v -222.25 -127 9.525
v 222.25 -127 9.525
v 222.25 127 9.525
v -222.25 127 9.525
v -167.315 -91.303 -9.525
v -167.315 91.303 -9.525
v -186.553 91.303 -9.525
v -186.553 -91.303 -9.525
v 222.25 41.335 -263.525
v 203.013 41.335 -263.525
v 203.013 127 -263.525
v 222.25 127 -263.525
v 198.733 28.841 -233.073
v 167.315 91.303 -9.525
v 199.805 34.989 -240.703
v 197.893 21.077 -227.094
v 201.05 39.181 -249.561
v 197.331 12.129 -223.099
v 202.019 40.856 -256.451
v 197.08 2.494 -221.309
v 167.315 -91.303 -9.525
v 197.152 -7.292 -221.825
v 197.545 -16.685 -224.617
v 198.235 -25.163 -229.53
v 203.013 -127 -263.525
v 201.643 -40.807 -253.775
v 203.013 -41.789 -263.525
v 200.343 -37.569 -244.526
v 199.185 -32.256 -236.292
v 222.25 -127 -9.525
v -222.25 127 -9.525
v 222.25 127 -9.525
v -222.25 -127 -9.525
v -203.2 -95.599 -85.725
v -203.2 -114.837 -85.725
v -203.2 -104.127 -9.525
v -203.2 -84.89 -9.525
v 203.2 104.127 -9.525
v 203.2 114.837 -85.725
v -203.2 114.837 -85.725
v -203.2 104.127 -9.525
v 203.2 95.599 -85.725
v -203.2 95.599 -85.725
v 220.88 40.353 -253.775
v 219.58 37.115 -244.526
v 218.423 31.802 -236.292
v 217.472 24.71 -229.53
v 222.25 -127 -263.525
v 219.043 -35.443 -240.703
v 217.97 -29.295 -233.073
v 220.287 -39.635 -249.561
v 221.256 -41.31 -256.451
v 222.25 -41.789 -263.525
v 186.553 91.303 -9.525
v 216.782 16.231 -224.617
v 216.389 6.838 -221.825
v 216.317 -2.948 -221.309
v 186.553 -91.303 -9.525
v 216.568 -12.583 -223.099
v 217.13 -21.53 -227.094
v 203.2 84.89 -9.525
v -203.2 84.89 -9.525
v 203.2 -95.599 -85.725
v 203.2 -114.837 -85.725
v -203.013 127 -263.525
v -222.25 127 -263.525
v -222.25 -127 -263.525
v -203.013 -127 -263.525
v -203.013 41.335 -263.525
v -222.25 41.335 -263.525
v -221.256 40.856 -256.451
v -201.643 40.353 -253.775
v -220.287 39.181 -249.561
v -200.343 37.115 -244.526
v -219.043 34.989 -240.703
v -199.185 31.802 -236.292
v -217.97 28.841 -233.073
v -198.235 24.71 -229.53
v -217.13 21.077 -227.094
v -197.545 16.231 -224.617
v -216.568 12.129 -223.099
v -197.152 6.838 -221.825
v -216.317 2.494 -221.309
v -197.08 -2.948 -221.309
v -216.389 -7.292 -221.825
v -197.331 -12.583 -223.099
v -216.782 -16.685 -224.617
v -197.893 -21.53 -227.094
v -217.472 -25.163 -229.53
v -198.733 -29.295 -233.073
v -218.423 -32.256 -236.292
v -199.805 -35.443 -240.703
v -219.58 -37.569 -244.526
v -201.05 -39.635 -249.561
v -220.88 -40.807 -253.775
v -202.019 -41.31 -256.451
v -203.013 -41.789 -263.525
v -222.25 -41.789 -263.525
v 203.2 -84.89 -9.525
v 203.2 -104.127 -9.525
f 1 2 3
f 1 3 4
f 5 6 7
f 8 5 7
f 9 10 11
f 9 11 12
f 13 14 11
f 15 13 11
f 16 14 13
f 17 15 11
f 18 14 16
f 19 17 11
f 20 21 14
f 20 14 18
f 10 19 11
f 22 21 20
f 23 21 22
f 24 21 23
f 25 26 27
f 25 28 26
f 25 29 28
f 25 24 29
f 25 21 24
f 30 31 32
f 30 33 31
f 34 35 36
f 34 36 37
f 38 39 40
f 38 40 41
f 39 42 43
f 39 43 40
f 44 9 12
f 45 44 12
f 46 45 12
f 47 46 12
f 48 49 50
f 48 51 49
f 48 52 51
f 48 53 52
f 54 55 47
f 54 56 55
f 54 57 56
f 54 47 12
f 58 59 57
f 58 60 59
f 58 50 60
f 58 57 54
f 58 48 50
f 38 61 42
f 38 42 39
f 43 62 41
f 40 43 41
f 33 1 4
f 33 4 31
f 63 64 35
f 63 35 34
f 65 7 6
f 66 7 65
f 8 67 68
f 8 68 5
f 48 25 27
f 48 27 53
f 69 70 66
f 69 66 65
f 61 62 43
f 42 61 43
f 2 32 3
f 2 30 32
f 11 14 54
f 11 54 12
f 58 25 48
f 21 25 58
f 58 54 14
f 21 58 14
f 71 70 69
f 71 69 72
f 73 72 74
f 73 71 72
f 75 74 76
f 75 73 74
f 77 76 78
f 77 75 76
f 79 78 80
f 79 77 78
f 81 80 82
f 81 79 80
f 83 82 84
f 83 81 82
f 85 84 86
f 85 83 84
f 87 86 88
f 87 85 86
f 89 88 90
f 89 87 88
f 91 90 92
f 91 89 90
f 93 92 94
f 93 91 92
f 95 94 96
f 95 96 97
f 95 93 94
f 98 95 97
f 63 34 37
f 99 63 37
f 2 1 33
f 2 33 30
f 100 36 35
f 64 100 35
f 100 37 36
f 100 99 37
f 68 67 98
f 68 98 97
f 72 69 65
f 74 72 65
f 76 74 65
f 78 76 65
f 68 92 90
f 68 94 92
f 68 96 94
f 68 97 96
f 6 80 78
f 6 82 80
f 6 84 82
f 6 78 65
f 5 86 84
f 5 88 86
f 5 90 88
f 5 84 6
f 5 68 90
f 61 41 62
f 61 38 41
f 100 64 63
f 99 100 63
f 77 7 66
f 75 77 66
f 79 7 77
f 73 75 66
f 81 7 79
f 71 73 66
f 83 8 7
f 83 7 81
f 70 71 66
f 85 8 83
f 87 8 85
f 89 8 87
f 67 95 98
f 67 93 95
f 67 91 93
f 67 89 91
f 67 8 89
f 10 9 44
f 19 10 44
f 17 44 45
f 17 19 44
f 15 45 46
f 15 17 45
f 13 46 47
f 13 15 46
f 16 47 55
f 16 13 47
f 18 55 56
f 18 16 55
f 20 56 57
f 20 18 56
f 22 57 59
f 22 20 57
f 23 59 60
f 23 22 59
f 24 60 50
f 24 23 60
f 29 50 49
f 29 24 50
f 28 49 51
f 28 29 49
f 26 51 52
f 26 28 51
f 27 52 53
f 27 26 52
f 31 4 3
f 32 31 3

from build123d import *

# Parameters (mm, degrees)
F1_DEPTH      = 127
F2_DEPTH      = 127
F2_DEPTH_BACK = 127
F4_DEPTH      = 222.251
F4_DEPTH_BACK = 222.251
F6_DEPTH      = 203.2


with BuildPart() as f1:
    # F0 (on Front) → F1 (new body, symmetric)
    with BuildSketch(Plane.XZ):
        Polygon((222.25, -9.525), (222.25, 9.525), (-222.25, 9.525), (-222.25, -9.525), (-200.8315767914, -9.525), (-186.5526279856, -9.525), (-167.3154127291, -9.525), (167.3154127291, -9.525), (186.5526279856, -9.525), (200.8315767914, -9.525), align=None)
    extrude(amount=F1_DEPTH, both=True)


with BuildPart() as f2:
    # F0 (on Front) → F2 (new body, two sides)
    with BuildSketch(Plane.XZ) as f2_sk:
        Polygon((-167.3154127291, -9.525), (-186.5526279856, -9.525), (-193.6921023885, -60.325), (-174.454887132, -60.325), align=None)
        Polygon((-174.454887132, -60.325), (-193.6921023885, -60.325), (-222.25, -263.525), (-203.0127847435, -263.525), align=None)
    extrude(amount=F2_DEPTH)
    extrude(f2_sk.sketch, amount=-F2_DEPTH_BACK)


with BuildPart() as f2b:
    # F0 (on Front) → F2, piece 2 (new body, two sides)
    with BuildSketch(Plane.XZ) as f2_2_sk:
        Polygon((193.6921023885, -60.325), (186.5526279856, -9.525), (167.3154127291, -9.525), (174.454887132, -60.325), align=None)
        Polygon((222.25, -263.525), (193.6921023885, -60.325), (174.454887132, -60.325), (203.0127847435, -263.525), align=None)
    extrude(amount=F2_DEPTH)
    extrude(f2_2_sk.sketch, amount=-F2_DEPTH_BACK)


with BuildPart() as f4_tool:
    # F3 (on Right) → F4 (new body, two sides)
    with BuildSketch(Plane.YZ) as f4_sk:
        Polygon((-127, -263.525), (-91.3026279856, -9.525), (-127, -9.525), align=None)
        with BuildLine():
            Line((-41.7890772223, -263.525), (41.3353252225, -263.525))
            ThreePointArc((41.3353252225, -263.525), (-0.2268759999, -221.2201001748), (-41.7890772223, -263.525))
        make_face()
        Polygon((126.9999999998, -263.525), (126.9999999998, -9.525), (91.3026279854, -9.525), align=None)
    extrude(amount=-F4_DEPTH)
    extrude(f4_sk.sketch, amount=F4_DEPTH_BACK)


with BuildPart() as f2_1:
    add(f2.part)

    # F4: cut by f4_tool
    add(f4_tool.part, mode=Mode.SUBTRACT)


with BuildPart() as f2b_1:
    add(f2b.part)

    # F4: cut by f4_tool
    add(f4_tool.part, mode=Mode.SUBTRACT)


with BuildPart() as f6:
    # F5 (on Right) → F6 (new body, symmetric)
    with BuildSketch(Plane.YZ):
        Polygon((-84.8902228999, -9.525), (-104.1274381564, -9.525), (-114.8366497607, -85.725), (-95.5994345042, -85.725), align=None)
    extrude(amount=F6_DEPTH, both=True)


with BuildPart() as f6b:
    # F5 (on Right) → F6, piece 2 (new body, symmetric)
    with BuildSketch(Plane.YZ):
        Polygon((84.8902228999, -9.525), (95.5994345042, -85.725), (114.8366497607, -85.725), (104.1274381564, -9.525), align=None)
    extrude(amount=F6_DEPTH, both=True)


solid = Compound([f1.part, f2_1.part, f2b_1.part, f6.part, f6b.part])
